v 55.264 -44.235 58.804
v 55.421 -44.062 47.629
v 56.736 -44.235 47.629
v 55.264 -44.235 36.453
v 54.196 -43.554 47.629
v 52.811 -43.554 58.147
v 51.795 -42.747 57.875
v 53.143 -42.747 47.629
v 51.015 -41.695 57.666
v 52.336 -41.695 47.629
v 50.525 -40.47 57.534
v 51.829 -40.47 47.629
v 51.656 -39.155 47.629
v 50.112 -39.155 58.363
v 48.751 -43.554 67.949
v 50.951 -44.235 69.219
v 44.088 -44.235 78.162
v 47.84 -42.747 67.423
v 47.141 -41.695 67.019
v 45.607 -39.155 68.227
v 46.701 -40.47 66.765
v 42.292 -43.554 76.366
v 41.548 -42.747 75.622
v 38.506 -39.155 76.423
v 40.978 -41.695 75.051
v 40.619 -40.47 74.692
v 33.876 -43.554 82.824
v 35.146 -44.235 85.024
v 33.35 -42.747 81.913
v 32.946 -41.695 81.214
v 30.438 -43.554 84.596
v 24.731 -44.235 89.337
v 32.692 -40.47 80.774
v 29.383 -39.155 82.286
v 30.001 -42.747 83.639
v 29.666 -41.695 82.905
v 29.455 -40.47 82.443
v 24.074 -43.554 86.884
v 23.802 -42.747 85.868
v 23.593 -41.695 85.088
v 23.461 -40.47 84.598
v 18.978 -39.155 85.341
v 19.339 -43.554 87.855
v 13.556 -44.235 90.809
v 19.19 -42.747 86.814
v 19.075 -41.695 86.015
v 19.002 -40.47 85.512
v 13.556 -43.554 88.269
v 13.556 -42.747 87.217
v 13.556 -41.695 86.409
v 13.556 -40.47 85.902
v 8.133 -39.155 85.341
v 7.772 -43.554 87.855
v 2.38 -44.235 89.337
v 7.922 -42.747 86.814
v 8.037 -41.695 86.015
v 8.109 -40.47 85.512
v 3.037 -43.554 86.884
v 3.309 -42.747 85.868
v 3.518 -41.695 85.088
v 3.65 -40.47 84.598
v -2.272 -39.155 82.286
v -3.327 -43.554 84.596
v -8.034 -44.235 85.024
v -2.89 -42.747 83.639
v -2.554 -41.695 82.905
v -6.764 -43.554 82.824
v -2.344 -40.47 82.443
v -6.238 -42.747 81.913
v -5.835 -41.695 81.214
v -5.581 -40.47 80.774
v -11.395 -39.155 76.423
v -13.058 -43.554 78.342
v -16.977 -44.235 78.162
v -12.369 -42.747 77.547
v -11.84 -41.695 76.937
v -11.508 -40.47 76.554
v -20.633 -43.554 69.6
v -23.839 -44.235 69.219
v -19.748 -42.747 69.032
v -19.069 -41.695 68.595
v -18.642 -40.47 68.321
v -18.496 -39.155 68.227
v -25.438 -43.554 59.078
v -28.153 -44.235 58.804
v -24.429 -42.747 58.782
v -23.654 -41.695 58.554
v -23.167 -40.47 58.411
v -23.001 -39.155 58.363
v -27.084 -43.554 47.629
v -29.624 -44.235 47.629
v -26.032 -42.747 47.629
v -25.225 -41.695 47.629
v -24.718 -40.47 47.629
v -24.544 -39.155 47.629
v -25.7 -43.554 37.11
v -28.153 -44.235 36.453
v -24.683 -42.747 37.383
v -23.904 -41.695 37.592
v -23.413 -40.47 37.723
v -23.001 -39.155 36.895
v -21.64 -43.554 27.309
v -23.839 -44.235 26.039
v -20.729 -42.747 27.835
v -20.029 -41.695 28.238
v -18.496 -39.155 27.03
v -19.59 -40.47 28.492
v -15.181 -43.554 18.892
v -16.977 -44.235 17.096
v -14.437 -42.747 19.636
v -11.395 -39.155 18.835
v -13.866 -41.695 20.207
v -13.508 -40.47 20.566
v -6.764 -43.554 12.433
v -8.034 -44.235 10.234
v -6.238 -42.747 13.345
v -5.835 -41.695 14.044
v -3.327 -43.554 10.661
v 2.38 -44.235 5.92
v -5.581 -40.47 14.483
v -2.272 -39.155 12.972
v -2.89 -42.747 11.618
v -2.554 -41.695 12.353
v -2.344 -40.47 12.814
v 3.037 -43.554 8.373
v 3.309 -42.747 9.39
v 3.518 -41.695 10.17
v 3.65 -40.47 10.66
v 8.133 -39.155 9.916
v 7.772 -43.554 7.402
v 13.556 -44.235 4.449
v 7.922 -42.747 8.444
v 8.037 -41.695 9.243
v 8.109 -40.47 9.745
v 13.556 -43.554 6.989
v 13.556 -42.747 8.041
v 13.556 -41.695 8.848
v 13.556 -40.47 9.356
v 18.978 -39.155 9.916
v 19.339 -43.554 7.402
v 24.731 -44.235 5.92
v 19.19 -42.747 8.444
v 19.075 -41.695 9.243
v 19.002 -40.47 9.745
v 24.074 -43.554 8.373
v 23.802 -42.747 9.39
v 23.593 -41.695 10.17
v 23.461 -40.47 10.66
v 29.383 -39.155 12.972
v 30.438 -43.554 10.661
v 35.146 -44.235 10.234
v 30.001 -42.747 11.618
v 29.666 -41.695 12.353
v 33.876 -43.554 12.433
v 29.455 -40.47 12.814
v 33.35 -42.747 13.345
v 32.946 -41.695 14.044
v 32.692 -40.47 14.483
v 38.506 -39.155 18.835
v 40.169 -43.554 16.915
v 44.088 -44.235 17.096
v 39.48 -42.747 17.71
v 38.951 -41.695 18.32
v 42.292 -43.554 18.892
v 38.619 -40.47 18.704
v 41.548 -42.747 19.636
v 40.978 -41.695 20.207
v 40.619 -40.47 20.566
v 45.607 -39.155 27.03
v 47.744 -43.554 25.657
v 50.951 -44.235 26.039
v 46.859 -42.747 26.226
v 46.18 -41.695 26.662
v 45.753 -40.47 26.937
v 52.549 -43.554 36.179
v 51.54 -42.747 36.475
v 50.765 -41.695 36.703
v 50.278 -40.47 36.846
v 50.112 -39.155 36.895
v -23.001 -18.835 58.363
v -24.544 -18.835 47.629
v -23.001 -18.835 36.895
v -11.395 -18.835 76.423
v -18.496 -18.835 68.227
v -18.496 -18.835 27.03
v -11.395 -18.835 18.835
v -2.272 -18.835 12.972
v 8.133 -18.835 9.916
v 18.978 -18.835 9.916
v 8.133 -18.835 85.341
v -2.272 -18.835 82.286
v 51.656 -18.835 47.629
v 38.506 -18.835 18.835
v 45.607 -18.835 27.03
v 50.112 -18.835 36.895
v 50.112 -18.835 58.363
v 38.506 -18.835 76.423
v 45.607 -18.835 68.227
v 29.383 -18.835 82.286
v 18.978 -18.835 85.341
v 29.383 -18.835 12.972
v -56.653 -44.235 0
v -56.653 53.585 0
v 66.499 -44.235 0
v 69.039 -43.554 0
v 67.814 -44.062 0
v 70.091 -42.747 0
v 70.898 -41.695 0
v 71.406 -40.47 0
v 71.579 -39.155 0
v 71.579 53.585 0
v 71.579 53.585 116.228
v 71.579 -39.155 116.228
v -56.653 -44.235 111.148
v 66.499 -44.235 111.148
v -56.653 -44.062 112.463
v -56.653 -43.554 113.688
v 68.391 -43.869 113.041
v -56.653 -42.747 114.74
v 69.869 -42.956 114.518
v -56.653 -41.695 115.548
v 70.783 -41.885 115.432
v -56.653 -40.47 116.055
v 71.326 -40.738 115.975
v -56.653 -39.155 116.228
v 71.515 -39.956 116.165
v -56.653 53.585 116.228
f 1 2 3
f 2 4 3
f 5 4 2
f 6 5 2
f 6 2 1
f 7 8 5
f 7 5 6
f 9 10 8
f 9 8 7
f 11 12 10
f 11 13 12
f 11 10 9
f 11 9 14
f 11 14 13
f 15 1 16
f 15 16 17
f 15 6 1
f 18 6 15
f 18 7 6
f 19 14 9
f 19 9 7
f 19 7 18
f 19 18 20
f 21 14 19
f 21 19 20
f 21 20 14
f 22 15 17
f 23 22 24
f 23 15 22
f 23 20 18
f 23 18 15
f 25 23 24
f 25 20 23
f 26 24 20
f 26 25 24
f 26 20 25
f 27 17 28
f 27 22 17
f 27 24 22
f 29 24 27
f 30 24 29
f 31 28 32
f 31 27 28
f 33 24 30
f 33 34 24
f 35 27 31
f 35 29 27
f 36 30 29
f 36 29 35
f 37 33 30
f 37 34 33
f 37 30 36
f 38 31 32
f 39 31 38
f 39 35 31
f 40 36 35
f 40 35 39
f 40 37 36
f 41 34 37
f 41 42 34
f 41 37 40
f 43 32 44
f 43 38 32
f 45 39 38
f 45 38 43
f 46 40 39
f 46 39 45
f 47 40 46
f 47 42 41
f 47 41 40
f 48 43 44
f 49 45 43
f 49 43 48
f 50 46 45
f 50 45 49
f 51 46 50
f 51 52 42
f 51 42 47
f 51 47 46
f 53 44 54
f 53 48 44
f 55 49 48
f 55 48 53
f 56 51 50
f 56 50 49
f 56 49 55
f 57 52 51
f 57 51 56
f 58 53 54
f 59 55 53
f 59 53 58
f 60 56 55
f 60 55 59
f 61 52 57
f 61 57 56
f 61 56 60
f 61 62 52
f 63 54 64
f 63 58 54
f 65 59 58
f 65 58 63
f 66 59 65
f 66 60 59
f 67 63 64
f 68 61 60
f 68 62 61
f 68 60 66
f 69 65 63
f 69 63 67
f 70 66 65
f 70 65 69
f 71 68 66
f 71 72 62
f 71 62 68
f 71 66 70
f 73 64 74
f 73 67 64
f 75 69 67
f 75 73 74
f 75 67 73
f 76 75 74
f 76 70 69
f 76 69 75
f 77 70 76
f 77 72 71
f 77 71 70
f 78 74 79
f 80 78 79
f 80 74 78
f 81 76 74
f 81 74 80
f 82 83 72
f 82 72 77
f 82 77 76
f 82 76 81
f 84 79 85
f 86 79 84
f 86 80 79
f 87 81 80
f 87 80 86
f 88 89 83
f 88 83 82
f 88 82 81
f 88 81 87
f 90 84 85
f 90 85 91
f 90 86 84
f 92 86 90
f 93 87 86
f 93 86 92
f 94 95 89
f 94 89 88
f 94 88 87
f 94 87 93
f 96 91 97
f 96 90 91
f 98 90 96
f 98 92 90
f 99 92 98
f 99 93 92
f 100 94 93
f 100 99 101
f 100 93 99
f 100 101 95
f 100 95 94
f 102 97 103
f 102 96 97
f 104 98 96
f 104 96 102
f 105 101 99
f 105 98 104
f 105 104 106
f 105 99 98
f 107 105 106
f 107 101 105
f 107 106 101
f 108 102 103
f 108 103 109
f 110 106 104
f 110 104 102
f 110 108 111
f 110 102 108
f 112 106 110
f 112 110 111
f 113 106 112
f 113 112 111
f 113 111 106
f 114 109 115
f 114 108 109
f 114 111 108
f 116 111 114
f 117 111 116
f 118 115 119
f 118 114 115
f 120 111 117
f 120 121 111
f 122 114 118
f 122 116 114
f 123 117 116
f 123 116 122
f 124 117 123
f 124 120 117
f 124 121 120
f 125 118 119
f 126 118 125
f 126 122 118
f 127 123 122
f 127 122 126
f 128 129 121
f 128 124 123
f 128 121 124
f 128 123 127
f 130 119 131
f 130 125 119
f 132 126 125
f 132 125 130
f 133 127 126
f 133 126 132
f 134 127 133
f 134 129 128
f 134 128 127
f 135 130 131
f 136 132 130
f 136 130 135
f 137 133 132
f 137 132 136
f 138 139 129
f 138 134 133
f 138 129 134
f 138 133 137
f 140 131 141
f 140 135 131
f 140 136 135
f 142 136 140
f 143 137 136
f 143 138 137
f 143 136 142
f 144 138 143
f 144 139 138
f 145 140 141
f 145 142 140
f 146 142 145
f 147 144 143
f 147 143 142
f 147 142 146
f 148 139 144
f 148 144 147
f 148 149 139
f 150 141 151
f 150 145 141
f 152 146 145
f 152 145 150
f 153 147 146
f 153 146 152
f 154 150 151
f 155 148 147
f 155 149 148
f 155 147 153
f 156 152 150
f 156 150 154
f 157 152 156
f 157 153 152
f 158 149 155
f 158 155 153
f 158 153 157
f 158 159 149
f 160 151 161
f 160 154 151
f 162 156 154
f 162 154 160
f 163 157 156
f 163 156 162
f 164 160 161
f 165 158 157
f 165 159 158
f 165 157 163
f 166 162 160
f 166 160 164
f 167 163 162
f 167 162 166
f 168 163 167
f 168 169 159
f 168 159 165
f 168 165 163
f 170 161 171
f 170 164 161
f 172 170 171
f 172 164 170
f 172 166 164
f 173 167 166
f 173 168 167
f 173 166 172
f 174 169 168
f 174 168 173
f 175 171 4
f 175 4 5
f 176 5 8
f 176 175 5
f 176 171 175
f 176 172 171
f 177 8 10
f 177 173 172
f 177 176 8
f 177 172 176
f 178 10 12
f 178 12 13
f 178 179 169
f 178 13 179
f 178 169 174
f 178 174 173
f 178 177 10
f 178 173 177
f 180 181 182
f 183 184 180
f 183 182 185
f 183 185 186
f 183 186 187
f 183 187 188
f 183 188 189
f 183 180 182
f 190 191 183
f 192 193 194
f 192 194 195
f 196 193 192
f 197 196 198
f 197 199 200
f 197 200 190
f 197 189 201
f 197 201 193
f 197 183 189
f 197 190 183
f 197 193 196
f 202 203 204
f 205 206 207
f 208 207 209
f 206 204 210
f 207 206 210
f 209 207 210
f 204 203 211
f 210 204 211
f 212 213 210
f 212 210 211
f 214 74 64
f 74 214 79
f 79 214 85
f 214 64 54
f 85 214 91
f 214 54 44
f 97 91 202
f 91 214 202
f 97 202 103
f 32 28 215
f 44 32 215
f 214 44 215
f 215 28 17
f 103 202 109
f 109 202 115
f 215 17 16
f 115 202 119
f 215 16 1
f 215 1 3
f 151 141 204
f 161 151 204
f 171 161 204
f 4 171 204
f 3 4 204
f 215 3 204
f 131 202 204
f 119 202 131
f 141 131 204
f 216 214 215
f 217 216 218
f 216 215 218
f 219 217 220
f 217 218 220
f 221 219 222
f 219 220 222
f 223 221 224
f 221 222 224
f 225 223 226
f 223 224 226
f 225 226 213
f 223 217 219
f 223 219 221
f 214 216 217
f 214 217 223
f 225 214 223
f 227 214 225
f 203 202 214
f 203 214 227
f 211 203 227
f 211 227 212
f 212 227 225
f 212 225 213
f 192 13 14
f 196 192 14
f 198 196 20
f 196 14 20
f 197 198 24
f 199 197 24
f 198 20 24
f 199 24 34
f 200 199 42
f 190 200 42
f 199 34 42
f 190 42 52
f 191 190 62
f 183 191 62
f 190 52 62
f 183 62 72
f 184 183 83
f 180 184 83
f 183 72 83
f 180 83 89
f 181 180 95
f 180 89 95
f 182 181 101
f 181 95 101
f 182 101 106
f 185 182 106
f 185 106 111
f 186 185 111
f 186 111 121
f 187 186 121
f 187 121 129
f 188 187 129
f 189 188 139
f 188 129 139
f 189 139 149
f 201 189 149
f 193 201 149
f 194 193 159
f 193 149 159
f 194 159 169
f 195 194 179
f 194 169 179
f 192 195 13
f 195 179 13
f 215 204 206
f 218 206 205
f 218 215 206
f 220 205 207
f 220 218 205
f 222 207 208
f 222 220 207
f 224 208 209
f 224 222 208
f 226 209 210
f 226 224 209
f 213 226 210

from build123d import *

# Parameters (mm, degrees)
F0_W     = 128.2316669822
F0_H     = 97.8200212121
F1_DEPTH = 116.2282433361
F2_R     = 38.1
F3_DEPTH = 25.4
F4_R     = 5.08


with BuildPart() as f1:
    # F0 (on Top) → F1 (new body)
    with BuildSketch(Plane.XY):
        with Locations((7.463093847, 4.6752728522)):
            Rectangle(F0_W, F0_H)
    extrude(amount=F1_DEPTH)

    # F2 (on face) → F3 (cut)
    with BuildSketch(Plane.XZ.offset(44.2347377539)):
        with Locations((13.5555826128, 47.6286895573)):
            Circle(F2_R)
    extrude(amount=-F3_DEPTH, mode=Mode.SUBTRACT)

    # F4
    f4_edges = [f1.edges().sort_by_distance(p)[0] for p in [
        (71.578927, -44.234738, 58.114122),
        (7.463094, -44.234738, 116.228243),
        (-24.544417, -44.234738, 47.62869),
    ]]
    fillet(f4_edges, radius=F4_R)


solid = f1.part
